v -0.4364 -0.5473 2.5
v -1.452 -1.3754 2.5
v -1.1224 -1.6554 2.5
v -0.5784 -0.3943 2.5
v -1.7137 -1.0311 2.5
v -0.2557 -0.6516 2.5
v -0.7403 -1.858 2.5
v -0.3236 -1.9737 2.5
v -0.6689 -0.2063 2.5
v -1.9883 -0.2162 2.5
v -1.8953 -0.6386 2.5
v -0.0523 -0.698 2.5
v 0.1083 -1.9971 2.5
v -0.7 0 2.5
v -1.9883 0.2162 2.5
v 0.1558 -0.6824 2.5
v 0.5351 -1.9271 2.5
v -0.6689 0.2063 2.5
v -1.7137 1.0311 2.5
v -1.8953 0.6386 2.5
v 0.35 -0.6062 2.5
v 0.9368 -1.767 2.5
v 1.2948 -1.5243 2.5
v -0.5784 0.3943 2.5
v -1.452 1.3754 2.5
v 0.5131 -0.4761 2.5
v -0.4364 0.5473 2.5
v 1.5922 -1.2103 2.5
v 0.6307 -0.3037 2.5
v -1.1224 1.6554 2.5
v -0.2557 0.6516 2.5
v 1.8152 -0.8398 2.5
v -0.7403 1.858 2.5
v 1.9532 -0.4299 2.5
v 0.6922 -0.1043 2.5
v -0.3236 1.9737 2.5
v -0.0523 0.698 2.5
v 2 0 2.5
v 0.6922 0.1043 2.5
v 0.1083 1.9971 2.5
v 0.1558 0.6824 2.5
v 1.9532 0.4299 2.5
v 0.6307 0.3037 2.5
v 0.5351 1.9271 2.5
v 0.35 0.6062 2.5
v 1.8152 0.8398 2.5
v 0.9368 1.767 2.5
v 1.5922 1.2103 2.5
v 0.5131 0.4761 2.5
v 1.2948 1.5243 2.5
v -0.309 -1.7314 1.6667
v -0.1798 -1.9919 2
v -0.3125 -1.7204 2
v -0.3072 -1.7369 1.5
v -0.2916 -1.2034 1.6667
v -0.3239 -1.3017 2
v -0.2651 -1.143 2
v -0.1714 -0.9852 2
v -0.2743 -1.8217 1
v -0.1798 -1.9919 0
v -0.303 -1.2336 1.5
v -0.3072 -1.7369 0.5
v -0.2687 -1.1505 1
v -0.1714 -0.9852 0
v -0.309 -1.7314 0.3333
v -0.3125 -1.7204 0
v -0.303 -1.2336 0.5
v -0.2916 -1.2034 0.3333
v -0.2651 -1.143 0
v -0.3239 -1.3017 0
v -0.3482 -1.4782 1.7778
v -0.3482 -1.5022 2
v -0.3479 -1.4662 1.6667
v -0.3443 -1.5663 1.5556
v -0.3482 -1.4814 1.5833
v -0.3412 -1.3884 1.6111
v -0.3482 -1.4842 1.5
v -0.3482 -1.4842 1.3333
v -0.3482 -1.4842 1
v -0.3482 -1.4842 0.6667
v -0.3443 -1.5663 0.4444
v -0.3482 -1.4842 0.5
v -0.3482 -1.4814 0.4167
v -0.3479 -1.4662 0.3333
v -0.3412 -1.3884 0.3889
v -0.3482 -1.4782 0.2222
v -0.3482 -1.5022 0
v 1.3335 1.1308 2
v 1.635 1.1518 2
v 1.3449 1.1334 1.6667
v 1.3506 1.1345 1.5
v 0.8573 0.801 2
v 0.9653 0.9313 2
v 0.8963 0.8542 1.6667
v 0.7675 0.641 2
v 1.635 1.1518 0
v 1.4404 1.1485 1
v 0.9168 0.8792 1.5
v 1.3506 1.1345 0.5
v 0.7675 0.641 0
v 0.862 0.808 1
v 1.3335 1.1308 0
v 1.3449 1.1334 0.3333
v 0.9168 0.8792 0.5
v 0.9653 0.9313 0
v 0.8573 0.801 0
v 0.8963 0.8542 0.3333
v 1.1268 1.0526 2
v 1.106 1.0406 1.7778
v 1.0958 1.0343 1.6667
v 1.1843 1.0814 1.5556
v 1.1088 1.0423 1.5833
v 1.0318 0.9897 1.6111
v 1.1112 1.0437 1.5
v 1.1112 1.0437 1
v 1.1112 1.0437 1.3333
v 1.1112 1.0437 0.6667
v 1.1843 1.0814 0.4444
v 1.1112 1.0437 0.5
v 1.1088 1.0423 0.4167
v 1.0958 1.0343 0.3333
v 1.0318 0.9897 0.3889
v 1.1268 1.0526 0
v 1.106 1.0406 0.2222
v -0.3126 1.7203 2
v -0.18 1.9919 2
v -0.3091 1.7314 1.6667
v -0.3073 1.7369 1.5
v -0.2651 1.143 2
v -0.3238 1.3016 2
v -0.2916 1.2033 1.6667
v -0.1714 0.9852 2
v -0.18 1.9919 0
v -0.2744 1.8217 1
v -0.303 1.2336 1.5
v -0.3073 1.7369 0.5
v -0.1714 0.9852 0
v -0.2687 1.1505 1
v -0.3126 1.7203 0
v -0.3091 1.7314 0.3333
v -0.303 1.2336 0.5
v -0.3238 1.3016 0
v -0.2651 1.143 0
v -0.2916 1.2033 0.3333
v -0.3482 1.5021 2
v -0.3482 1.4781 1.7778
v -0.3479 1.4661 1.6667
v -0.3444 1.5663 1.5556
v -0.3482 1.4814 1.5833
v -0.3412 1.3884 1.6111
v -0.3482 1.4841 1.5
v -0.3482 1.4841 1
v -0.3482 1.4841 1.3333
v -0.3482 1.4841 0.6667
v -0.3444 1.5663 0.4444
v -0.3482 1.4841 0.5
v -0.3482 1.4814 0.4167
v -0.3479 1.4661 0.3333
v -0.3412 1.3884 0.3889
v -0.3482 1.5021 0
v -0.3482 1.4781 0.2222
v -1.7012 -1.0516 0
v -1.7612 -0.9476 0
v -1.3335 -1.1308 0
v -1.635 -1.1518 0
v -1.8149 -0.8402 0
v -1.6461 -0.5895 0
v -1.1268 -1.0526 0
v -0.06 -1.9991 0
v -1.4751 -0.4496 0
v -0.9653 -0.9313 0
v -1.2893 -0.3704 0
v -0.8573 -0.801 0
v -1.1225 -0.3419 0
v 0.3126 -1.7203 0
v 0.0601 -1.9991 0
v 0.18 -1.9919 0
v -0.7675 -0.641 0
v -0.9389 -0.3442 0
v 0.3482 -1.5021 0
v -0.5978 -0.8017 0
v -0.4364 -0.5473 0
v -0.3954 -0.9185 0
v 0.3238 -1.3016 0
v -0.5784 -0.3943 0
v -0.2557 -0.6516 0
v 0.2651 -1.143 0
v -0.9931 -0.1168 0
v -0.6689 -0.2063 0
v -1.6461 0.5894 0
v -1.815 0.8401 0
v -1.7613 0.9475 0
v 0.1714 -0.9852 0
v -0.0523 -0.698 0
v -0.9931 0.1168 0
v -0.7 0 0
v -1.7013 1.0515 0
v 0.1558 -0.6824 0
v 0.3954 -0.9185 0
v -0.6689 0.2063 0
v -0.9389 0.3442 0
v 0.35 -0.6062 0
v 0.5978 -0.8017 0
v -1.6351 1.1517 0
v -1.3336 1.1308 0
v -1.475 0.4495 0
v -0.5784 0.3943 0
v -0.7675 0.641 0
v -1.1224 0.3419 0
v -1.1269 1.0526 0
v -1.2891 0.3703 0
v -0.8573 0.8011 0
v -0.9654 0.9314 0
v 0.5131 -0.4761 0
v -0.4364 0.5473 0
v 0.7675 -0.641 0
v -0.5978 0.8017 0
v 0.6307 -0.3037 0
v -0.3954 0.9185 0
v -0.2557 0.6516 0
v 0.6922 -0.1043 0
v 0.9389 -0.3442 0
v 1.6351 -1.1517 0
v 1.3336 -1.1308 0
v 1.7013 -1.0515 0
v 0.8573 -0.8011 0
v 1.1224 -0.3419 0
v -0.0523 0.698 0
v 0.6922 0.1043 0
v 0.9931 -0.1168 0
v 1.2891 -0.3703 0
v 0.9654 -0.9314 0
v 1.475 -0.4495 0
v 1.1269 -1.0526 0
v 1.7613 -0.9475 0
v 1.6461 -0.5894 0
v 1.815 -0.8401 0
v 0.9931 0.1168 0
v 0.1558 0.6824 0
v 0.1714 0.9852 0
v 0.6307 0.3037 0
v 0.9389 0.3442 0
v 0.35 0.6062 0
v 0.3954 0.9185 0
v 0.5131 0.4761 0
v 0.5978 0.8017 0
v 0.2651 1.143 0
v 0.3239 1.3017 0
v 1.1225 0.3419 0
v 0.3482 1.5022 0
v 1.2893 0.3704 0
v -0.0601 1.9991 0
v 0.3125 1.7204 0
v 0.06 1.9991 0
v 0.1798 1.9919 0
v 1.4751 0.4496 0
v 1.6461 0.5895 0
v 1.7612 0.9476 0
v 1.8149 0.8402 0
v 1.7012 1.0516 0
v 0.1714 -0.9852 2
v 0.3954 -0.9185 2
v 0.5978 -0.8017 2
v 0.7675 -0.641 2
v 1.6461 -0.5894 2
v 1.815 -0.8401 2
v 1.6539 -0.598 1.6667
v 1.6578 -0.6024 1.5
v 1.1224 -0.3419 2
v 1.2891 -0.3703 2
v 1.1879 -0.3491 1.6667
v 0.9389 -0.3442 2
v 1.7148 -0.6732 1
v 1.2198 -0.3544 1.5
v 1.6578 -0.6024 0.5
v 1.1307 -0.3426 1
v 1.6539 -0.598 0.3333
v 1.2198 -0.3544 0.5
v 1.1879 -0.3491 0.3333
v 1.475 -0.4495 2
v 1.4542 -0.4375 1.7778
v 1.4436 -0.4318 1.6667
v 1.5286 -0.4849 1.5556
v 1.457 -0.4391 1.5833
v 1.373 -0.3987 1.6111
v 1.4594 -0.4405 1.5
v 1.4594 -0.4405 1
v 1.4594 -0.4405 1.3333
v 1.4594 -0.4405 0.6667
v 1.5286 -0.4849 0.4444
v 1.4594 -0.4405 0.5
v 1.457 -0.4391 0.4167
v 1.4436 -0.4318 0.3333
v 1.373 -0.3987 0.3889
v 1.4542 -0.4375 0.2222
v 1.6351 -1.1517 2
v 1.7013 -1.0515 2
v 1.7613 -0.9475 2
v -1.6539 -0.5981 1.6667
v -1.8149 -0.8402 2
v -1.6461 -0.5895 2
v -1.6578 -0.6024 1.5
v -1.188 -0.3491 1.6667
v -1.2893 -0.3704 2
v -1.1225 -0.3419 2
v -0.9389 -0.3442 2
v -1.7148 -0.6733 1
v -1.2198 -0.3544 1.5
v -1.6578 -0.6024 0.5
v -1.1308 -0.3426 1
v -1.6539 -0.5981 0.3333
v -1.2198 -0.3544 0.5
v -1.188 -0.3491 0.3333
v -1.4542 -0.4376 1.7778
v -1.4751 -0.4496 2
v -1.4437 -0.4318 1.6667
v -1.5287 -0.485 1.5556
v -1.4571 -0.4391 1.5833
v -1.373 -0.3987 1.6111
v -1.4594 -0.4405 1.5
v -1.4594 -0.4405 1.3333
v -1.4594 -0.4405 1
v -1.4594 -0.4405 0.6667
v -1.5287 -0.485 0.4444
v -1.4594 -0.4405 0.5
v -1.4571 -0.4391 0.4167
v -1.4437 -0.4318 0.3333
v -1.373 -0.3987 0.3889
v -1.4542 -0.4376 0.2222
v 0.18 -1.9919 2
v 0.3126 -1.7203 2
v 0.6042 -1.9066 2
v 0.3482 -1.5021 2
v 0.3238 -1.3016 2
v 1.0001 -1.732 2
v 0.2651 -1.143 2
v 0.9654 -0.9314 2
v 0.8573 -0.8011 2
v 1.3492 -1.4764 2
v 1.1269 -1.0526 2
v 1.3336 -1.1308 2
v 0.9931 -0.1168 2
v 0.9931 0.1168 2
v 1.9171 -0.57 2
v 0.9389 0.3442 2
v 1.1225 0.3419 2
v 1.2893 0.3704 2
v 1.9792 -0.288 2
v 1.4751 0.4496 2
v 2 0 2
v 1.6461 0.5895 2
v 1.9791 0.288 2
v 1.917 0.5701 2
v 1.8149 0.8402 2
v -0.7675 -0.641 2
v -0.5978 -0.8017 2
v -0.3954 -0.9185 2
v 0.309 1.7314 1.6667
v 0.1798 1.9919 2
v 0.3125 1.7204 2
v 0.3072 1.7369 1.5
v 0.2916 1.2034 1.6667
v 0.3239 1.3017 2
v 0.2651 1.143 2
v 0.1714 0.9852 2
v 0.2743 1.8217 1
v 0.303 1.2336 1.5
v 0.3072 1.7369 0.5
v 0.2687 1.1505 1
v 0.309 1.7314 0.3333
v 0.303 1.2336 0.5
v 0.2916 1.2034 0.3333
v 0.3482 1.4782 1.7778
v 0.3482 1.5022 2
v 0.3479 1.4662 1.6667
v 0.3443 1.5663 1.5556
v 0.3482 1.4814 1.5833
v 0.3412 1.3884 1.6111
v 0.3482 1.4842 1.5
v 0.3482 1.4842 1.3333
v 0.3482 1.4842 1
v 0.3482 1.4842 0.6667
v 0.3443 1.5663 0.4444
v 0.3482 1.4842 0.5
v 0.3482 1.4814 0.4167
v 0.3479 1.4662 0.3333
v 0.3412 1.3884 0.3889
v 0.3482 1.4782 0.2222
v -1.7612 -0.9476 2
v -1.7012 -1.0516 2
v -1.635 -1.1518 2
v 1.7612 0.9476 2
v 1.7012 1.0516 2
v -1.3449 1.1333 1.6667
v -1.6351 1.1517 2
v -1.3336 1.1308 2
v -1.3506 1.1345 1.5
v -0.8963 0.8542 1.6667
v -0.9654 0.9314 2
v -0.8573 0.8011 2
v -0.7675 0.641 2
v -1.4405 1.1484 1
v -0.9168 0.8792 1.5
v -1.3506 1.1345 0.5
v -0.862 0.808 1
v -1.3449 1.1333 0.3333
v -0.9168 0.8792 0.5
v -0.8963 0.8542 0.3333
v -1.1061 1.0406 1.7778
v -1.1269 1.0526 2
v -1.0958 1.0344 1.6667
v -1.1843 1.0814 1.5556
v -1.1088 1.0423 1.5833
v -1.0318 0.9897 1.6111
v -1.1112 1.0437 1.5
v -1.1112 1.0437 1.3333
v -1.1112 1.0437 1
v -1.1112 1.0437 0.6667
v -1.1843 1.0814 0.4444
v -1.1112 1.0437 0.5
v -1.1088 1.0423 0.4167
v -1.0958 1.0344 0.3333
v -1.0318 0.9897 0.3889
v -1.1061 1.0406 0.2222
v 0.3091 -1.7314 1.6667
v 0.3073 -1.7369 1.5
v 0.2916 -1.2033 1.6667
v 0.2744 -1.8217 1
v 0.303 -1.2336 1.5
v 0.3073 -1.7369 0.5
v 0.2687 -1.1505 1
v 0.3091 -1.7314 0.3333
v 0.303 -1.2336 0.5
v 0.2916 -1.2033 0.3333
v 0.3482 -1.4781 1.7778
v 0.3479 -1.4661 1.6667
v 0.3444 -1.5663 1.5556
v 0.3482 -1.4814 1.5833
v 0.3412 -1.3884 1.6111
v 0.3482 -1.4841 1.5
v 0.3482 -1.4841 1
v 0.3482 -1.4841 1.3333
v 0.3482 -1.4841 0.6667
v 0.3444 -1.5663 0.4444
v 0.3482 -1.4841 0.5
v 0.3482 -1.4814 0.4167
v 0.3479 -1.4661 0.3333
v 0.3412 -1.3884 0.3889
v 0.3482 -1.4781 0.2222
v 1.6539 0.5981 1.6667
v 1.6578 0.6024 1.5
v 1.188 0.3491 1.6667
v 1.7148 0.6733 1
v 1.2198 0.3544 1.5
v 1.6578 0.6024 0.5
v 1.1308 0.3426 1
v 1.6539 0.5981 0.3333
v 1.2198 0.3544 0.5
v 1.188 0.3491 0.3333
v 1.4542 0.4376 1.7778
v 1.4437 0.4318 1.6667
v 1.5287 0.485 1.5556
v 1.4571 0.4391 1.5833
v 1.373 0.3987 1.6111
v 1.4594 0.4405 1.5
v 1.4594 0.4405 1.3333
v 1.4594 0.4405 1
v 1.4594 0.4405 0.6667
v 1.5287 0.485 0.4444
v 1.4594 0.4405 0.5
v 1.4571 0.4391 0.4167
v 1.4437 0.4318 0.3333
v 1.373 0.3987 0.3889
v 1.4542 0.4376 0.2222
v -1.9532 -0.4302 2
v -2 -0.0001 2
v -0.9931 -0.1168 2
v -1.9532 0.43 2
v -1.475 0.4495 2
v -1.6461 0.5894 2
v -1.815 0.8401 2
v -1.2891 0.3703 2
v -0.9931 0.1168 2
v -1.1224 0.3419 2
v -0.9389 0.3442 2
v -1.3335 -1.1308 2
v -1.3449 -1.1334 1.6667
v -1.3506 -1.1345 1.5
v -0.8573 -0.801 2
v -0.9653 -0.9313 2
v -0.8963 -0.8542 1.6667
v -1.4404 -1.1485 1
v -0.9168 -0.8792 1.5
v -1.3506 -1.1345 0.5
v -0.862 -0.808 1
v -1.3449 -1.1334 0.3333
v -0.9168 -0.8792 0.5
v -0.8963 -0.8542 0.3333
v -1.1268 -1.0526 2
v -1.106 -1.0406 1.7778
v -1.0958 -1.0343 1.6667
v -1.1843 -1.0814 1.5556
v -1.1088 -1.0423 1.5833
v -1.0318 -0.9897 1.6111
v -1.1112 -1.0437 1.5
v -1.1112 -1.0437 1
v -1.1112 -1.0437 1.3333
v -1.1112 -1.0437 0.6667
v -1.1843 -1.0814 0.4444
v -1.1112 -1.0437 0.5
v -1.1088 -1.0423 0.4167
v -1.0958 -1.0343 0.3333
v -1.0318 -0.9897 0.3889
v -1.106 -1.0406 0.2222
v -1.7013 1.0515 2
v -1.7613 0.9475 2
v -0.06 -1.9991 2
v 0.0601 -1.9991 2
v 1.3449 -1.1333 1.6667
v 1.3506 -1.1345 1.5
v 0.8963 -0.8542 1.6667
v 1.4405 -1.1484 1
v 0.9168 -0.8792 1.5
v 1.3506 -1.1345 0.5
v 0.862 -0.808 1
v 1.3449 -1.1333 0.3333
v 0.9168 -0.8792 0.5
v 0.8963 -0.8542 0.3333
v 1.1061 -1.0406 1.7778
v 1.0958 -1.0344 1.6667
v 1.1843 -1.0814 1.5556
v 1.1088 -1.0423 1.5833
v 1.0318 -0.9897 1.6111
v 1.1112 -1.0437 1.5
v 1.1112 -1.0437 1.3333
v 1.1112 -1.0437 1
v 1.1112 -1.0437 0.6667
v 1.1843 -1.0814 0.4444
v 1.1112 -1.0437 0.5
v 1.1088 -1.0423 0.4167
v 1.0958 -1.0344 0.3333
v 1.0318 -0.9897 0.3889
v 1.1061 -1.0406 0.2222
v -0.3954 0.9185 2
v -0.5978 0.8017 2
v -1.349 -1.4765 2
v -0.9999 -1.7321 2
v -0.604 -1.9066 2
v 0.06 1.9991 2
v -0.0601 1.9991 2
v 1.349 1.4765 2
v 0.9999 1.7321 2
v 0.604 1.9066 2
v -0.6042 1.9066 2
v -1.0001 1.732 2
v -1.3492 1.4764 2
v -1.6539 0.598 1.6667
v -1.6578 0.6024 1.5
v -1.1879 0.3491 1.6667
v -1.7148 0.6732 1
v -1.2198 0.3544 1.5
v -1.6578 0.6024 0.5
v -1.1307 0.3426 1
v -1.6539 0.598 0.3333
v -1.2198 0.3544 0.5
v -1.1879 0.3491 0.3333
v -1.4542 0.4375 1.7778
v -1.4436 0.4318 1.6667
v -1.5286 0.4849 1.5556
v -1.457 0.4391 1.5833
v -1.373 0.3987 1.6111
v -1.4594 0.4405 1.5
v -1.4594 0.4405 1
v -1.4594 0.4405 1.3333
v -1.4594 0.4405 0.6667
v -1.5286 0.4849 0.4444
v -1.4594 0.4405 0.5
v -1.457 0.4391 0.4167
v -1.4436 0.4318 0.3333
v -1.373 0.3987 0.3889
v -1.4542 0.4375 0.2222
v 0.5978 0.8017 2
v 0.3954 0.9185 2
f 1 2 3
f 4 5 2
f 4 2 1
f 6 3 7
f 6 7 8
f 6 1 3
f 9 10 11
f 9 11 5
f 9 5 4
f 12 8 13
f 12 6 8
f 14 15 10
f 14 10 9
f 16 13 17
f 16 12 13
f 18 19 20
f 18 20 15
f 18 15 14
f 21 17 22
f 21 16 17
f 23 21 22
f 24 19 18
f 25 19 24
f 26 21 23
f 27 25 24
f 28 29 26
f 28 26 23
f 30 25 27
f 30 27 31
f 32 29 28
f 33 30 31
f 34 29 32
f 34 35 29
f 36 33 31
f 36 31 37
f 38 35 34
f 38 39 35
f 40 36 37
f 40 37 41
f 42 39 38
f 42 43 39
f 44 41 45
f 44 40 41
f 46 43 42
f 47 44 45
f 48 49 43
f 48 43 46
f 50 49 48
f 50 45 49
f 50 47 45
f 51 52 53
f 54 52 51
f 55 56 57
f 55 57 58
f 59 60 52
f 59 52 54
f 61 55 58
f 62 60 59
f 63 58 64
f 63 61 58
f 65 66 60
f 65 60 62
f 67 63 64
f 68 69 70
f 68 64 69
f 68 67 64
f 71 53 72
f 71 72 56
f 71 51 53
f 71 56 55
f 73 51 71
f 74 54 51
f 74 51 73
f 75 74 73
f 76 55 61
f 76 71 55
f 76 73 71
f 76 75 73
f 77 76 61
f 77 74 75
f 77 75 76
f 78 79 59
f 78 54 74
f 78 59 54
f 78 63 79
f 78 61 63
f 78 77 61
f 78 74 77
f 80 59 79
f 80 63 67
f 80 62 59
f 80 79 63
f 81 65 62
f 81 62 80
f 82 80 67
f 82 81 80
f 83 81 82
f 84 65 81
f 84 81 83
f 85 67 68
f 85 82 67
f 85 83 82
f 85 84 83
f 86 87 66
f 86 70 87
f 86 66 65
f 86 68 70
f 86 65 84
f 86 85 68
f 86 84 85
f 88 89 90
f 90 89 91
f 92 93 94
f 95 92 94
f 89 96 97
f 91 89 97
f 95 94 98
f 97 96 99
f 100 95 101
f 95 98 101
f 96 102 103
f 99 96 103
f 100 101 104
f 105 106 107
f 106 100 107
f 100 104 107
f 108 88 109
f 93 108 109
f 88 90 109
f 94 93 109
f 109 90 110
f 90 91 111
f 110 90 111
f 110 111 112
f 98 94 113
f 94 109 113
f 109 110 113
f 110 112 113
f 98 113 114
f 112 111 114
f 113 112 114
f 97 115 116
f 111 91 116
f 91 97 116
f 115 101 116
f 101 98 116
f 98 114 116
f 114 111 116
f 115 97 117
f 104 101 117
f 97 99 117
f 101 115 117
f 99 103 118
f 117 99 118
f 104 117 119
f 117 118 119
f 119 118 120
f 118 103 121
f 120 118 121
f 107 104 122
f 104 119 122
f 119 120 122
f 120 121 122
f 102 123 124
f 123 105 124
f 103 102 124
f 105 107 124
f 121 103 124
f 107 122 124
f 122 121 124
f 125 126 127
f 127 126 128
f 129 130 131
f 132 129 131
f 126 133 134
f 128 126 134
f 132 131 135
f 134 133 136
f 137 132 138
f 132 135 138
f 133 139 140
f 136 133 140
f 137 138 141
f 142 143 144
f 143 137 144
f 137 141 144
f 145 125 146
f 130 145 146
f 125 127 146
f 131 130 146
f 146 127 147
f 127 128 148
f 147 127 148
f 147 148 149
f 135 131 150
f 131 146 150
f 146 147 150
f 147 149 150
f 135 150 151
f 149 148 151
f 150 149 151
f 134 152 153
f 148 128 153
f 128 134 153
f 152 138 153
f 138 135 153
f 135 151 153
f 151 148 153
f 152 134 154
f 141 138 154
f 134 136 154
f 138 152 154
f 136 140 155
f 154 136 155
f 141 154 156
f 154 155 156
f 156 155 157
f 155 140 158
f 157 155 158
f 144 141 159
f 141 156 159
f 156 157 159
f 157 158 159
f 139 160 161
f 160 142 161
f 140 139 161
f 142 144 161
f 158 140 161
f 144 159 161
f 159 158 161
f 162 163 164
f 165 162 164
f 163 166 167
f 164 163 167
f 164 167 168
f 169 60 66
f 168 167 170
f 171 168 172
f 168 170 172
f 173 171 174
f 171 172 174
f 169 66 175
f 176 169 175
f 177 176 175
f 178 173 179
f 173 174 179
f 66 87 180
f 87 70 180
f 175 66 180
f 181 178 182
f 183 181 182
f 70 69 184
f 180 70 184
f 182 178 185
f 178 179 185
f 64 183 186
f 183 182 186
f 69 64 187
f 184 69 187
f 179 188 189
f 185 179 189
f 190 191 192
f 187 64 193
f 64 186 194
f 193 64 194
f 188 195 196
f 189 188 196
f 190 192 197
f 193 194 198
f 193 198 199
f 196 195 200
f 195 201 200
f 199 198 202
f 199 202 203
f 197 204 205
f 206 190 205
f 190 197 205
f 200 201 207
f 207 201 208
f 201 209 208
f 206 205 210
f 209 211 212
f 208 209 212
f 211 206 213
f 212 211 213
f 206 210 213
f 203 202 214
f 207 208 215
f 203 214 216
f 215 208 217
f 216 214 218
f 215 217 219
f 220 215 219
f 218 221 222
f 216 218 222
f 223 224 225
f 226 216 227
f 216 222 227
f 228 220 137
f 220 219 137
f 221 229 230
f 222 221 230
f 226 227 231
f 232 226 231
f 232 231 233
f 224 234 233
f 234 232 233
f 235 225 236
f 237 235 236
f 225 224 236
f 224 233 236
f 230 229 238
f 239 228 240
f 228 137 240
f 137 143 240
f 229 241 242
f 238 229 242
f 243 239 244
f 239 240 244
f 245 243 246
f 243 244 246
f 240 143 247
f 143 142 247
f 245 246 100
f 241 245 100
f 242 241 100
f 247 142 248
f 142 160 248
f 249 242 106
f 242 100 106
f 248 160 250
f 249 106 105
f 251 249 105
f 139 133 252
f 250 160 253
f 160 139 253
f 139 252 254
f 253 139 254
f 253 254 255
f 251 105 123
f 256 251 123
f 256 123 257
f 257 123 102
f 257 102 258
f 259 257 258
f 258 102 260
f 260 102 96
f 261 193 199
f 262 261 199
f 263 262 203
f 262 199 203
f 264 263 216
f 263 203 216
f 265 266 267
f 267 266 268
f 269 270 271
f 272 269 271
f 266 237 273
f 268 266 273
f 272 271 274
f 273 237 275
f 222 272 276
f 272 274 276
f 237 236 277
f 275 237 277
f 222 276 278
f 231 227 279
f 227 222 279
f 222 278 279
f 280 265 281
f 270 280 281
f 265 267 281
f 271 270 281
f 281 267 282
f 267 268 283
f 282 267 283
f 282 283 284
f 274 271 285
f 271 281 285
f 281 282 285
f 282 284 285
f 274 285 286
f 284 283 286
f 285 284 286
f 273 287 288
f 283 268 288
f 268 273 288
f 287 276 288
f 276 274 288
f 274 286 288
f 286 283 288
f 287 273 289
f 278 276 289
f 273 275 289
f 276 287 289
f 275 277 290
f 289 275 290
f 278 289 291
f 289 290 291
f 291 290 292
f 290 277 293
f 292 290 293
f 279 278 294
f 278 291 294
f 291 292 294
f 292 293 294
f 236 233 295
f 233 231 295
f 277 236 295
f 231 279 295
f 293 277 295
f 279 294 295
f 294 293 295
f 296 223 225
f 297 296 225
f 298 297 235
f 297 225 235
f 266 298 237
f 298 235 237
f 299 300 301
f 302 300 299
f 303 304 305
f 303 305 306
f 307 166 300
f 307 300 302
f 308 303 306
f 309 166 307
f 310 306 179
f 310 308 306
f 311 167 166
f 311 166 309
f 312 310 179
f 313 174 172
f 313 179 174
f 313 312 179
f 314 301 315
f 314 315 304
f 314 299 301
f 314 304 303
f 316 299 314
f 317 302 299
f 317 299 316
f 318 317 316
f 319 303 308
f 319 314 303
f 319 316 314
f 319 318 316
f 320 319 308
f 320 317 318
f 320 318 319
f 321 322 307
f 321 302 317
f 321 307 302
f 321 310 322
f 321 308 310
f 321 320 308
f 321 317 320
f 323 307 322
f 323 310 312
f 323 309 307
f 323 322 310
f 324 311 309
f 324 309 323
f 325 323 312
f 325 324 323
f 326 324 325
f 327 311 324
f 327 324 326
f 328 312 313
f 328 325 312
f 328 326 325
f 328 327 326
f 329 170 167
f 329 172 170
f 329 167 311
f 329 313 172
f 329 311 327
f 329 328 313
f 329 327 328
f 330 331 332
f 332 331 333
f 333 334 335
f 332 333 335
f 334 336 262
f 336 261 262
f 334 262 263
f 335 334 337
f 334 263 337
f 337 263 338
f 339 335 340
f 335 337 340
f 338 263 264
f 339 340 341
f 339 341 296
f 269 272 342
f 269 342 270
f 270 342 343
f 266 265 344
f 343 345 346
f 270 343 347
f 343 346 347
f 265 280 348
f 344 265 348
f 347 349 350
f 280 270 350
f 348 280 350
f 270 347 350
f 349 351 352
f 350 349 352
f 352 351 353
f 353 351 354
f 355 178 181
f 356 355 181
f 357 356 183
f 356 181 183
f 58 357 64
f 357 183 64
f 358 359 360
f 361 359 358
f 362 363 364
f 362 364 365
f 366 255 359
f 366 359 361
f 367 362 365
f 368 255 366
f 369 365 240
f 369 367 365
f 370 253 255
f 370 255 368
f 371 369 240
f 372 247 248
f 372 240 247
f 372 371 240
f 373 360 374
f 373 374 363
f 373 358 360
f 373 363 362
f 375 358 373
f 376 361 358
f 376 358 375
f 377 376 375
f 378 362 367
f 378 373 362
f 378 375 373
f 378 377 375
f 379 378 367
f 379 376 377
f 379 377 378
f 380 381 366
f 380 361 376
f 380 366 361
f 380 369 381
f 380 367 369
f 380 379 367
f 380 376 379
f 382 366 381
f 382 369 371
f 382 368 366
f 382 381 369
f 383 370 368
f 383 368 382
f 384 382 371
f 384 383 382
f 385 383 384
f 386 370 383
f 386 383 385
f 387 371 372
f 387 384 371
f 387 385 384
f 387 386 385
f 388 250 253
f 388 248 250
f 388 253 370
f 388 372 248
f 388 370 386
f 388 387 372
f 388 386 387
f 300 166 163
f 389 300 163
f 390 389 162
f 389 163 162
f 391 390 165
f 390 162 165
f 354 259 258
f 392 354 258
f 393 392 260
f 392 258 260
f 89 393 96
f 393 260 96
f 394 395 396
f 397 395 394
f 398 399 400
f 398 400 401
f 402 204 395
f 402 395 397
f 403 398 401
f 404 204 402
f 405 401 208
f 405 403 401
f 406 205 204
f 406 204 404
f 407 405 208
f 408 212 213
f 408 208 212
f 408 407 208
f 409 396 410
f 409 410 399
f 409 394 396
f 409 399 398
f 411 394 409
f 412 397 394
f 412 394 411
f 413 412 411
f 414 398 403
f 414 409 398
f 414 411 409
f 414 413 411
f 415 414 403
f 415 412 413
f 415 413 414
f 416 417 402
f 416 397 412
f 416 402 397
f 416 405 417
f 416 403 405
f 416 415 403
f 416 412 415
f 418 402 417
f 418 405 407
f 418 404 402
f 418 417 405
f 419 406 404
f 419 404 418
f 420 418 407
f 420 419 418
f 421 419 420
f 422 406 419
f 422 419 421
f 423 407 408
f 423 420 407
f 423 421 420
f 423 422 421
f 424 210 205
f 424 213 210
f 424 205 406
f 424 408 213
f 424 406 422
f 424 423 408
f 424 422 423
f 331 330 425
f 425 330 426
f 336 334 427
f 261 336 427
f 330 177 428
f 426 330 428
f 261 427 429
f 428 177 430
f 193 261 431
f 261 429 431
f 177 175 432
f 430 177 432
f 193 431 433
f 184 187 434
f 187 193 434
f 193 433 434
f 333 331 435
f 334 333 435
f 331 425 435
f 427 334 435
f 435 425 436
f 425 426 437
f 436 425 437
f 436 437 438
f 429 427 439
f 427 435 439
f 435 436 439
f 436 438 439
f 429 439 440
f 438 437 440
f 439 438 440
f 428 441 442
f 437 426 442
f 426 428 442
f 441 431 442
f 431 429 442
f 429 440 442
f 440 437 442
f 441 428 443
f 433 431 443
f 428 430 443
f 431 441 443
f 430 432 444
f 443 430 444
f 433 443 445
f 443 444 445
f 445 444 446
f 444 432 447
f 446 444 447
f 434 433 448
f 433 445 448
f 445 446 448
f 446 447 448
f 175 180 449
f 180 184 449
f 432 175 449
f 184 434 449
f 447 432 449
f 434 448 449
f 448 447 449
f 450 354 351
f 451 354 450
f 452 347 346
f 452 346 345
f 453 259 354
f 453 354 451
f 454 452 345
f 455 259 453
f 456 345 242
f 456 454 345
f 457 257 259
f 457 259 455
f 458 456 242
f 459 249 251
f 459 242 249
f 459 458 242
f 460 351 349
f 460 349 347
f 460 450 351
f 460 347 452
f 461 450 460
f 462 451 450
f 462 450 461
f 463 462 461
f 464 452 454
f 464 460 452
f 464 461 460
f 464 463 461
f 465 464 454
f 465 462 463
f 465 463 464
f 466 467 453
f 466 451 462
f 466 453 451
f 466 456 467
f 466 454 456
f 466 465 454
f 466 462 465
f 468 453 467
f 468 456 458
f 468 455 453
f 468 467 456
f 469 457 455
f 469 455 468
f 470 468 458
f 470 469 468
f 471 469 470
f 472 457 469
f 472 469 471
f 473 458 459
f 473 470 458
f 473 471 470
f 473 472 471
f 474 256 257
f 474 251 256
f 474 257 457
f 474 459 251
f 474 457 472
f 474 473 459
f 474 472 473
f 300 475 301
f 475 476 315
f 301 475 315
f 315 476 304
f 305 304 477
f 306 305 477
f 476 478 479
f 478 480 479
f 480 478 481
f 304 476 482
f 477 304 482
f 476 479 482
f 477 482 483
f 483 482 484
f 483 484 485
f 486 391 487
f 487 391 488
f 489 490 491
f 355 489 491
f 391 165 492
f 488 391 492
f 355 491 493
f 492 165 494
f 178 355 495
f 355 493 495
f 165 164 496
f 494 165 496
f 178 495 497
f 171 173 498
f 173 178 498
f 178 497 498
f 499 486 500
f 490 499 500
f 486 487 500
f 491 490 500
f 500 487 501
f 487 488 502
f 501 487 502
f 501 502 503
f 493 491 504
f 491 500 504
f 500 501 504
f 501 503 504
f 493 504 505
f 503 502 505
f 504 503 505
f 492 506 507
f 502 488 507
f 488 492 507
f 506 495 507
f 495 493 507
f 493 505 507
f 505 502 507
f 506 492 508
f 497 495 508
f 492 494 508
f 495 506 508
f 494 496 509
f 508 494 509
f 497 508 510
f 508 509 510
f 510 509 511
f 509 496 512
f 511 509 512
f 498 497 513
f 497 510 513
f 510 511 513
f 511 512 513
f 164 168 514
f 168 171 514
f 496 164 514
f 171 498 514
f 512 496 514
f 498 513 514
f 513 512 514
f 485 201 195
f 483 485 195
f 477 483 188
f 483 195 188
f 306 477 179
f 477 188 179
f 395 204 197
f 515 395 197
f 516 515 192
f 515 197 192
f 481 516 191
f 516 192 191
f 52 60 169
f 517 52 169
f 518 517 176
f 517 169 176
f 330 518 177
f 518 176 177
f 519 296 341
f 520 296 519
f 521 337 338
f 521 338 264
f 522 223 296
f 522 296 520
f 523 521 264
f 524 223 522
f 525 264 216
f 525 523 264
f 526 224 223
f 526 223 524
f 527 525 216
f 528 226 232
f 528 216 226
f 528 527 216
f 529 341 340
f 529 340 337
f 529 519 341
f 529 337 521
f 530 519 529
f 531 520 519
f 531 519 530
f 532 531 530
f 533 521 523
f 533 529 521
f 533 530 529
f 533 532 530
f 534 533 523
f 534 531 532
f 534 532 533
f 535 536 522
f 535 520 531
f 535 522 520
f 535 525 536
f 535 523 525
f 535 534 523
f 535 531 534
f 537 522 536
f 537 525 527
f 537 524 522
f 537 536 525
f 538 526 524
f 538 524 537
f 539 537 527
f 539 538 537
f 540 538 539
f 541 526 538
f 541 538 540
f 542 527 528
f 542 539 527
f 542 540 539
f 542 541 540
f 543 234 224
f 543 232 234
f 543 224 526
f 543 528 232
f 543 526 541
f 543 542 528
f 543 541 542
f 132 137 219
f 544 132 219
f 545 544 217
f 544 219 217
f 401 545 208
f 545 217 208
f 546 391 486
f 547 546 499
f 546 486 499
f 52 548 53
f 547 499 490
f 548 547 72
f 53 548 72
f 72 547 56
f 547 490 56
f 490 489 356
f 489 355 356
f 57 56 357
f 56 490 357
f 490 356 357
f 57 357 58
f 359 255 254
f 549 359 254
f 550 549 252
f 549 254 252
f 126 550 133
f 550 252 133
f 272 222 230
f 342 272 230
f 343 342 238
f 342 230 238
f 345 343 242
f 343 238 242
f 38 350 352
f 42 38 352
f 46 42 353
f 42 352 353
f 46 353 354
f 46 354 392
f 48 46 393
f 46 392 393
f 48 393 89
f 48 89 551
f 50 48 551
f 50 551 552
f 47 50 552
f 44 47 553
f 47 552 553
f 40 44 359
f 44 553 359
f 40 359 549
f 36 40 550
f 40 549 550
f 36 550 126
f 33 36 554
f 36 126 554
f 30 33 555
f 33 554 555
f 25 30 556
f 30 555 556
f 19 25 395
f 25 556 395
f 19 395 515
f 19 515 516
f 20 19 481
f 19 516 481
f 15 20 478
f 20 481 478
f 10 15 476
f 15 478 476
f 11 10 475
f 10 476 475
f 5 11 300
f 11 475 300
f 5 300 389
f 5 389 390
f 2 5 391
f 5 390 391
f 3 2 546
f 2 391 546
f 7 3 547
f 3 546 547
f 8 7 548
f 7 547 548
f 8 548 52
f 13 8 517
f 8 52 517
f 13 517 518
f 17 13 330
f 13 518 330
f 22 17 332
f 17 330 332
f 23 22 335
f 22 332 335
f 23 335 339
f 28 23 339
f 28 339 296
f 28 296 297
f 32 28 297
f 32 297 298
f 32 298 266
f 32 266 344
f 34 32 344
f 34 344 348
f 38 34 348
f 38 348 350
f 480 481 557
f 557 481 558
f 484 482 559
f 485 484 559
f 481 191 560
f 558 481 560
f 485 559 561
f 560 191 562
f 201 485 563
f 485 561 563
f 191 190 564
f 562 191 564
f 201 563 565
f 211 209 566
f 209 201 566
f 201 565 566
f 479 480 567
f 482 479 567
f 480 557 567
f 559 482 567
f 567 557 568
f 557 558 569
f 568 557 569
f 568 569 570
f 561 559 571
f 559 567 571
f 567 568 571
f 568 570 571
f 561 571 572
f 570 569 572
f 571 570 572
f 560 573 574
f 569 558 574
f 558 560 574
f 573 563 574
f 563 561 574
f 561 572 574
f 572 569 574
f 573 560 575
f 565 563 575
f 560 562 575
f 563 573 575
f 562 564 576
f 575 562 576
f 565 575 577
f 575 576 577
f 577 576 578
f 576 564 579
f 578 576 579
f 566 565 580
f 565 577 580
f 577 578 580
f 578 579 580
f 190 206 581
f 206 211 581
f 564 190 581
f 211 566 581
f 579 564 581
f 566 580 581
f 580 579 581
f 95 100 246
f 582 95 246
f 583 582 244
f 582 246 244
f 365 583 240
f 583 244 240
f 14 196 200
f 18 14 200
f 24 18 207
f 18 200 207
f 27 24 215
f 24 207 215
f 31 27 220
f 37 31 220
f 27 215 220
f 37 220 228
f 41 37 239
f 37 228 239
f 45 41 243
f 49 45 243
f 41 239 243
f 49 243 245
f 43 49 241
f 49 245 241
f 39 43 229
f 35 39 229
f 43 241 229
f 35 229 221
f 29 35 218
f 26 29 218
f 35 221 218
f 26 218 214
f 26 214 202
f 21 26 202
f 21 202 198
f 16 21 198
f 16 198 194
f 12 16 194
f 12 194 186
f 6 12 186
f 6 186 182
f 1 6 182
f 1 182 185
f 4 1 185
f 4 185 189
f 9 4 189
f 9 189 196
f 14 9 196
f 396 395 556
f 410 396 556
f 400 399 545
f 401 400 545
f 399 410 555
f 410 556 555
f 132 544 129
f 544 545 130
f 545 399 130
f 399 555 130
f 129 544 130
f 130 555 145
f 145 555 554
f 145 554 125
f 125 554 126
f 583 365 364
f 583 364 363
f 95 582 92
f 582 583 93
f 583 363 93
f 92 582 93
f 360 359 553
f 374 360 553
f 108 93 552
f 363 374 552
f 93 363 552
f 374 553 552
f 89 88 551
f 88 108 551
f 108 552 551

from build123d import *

# Parameters (mm, degrees)
EXTRUDE_1_DEPTH     = 2
SKETCH_2_R          = 2
EXTRUDE_2_DEPTH     = 0.5
SKETCH_3_R          = 0.7
CUT_EXTRUDE_1_DEPTH = 3.5


with BuildPart() as part:
    # 草图1 → 凸台-拉伸1 (new body)
    with BuildSketch(Plane.XY):
        with BuildLine():
            ThreePointArc((-0.171402668, 0.985201058), (-0.5, 0.866025404), (-0.767507811, 0.641039594))
            add(Edge.make_bspline(
                [(-1.635127173, 1.15167666), (-1.021084682, 1.190983914), (-0.767507811, 0.641039594)],
                knots=[0, 0, 0, 1, 1, 1], degree=2))
            ThreePointArc((-1.635127173, 1.15167666), (-1.732096577, 0.999920721), (-1.815021739, 0.840057193))
            add(Edge.make_bspline(
                [(-1.815021739, 0.840057193), (-1.541873553, 0.288839145), (-0.938910478, 0.344161465)],
                knots=[0, 0, 0, 1, 1, 1], degree=2))
            ThreePointArc((-0.938910478, 0.344161465), (-1, 0), (-0.938910478, -0.344161465))
            add(Edge.make_bspline(
                [(-1.814944831, -0.84022334), (-1.541964666, -0.288793317), (-0.938910478, -0.344161465)],
                knots=[0, 0, 0, 1, 1, 1], degree=2))
            ThreePointArc((-1.814944831, -0.84022334), (-1.732005035, -1.000079277), (-1.635021739, -1.151826338))
            add(Edge.make_bspline(
                [(-1.635021739, -1.151826338), (-1.021078814, -1.190882094), (-0.767507811, -0.641039594)],
                knots=[0, 0, 0, 1, 1, 1], degree=2))
            ThreePointArc((-0.767507811, -0.641039594), (-0.5, -0.866025404), (-0.171402668, -0.985201058))
            add(Edge.make_bspline(
                [(-0.179817658, -1.9919), (-0.520879984, -1.479777231), (-0.171402668, -0.985201058)],
                knots=[0, 0, 0, 1, 1, 1], degree=2))
            ThreePointArc((-0.179817658, -1.9919), (9.1542e-05, -1.999999998), (0.18, -1.991883531))
            add(Edge.make_bspline(
                [(0.18, -1.991883531), (0.520794739, -1.479721239), (0.171402668, -0.985201058)],
                knots=[0, 0, 0, 1, 1, 1], degree=2))
            ThreePointArc((0.171402668, -0.985201058), (0.5, -0.866025404), (0.767507811, -0.641039594))
            add(Edge.make_bspline(
                [(1.635127173, -1.15167666), (1.021084682, -1.190983914), (0.767507811, -0.641039594)],
                knots=[0, 0, 0, 1, 1, 1], degree=2))
            ThreePointArc((1.635127173, -1.15167666), (1.732096577, -0.999920721), (1.815021739, -0.840057193))
            add(Edge.make_bspline(
                [(1.815021739, -0.840057193), (1.541873553, -0.288839145), (0.938910478, -0.344161465)],
                knots=[0, 0, 0, 1, 1, 1], degree=2))
            ThreePointArc((0.938910478, -0.344161465), (1, 0), (0.938910478, 0.344161465))
            add(Edge.make_bspline(
                [(1.814944831, 0.84022334), (1.541964666, 0.288793317), (0.938910478, 0.344161465)],
                knots=[0, 0, 0, 1, 1, 1], degree=2))
            ThreePointArc((1.814944831, 0.84022334), (1.732005035, 1.000079277), (1.635021739, 1.151826338))
            add(Edge.make_bspline(
                [(1.635021739, 1.151826338), (1.021078814, 1.190882094), (0.767507811, 0.641039594)],
                knots=[0, 0, 0, 1, 1, 1], degree=2))
            ThreePointArc((0.767507811, 0.641039594), (0.5, 0.866025404), (0.171402668, 0.985201058))
            add(Edge.make_bspline(
                [(0.179817658, 1.9919), (0.520879984, 1.479777231), (0.171402668, 0.985201058)],
                knots=[0, 0, 0, 1, 1, 1], degree=2))
            ThreePointArc((0.179817658, 1.9919), (-9.1542e-05, 1.999999998), (-0.18, 1.991883531))
            add(Edge.make_bspline(
                [(-0.18, 1.991883531), (-0.520794739, 1.479721239), (-0.171402668, 0.985201058)],
                knots=[0, 0, 0, 1, 1, 1], degree=2))
        make_face()
    extrude(amount=EXTRUDE_1_DEPTH)

    # 草图2 → 凸台-拉伸2 (add)
    with BuildSketch(Plane.XY.offset(2)):
        Circle(SKETCH_2_R)
    extrude(amount=EXTRUDE_2_DEPTH)

    # 草图3 → 切除-拉伸1 (cut, through all)
    with BuildSketch(Plane(origin=(0, 0, 0), x_dir=(-1, 0, 0), z_dir=(0, 0, -1))):
        Circle(SKETCH_3_R)
    extrude(amount=-CUT_EXTRUDE_1_DEPTH, mode=Mode.SUBTRACT)


solid = part.part
